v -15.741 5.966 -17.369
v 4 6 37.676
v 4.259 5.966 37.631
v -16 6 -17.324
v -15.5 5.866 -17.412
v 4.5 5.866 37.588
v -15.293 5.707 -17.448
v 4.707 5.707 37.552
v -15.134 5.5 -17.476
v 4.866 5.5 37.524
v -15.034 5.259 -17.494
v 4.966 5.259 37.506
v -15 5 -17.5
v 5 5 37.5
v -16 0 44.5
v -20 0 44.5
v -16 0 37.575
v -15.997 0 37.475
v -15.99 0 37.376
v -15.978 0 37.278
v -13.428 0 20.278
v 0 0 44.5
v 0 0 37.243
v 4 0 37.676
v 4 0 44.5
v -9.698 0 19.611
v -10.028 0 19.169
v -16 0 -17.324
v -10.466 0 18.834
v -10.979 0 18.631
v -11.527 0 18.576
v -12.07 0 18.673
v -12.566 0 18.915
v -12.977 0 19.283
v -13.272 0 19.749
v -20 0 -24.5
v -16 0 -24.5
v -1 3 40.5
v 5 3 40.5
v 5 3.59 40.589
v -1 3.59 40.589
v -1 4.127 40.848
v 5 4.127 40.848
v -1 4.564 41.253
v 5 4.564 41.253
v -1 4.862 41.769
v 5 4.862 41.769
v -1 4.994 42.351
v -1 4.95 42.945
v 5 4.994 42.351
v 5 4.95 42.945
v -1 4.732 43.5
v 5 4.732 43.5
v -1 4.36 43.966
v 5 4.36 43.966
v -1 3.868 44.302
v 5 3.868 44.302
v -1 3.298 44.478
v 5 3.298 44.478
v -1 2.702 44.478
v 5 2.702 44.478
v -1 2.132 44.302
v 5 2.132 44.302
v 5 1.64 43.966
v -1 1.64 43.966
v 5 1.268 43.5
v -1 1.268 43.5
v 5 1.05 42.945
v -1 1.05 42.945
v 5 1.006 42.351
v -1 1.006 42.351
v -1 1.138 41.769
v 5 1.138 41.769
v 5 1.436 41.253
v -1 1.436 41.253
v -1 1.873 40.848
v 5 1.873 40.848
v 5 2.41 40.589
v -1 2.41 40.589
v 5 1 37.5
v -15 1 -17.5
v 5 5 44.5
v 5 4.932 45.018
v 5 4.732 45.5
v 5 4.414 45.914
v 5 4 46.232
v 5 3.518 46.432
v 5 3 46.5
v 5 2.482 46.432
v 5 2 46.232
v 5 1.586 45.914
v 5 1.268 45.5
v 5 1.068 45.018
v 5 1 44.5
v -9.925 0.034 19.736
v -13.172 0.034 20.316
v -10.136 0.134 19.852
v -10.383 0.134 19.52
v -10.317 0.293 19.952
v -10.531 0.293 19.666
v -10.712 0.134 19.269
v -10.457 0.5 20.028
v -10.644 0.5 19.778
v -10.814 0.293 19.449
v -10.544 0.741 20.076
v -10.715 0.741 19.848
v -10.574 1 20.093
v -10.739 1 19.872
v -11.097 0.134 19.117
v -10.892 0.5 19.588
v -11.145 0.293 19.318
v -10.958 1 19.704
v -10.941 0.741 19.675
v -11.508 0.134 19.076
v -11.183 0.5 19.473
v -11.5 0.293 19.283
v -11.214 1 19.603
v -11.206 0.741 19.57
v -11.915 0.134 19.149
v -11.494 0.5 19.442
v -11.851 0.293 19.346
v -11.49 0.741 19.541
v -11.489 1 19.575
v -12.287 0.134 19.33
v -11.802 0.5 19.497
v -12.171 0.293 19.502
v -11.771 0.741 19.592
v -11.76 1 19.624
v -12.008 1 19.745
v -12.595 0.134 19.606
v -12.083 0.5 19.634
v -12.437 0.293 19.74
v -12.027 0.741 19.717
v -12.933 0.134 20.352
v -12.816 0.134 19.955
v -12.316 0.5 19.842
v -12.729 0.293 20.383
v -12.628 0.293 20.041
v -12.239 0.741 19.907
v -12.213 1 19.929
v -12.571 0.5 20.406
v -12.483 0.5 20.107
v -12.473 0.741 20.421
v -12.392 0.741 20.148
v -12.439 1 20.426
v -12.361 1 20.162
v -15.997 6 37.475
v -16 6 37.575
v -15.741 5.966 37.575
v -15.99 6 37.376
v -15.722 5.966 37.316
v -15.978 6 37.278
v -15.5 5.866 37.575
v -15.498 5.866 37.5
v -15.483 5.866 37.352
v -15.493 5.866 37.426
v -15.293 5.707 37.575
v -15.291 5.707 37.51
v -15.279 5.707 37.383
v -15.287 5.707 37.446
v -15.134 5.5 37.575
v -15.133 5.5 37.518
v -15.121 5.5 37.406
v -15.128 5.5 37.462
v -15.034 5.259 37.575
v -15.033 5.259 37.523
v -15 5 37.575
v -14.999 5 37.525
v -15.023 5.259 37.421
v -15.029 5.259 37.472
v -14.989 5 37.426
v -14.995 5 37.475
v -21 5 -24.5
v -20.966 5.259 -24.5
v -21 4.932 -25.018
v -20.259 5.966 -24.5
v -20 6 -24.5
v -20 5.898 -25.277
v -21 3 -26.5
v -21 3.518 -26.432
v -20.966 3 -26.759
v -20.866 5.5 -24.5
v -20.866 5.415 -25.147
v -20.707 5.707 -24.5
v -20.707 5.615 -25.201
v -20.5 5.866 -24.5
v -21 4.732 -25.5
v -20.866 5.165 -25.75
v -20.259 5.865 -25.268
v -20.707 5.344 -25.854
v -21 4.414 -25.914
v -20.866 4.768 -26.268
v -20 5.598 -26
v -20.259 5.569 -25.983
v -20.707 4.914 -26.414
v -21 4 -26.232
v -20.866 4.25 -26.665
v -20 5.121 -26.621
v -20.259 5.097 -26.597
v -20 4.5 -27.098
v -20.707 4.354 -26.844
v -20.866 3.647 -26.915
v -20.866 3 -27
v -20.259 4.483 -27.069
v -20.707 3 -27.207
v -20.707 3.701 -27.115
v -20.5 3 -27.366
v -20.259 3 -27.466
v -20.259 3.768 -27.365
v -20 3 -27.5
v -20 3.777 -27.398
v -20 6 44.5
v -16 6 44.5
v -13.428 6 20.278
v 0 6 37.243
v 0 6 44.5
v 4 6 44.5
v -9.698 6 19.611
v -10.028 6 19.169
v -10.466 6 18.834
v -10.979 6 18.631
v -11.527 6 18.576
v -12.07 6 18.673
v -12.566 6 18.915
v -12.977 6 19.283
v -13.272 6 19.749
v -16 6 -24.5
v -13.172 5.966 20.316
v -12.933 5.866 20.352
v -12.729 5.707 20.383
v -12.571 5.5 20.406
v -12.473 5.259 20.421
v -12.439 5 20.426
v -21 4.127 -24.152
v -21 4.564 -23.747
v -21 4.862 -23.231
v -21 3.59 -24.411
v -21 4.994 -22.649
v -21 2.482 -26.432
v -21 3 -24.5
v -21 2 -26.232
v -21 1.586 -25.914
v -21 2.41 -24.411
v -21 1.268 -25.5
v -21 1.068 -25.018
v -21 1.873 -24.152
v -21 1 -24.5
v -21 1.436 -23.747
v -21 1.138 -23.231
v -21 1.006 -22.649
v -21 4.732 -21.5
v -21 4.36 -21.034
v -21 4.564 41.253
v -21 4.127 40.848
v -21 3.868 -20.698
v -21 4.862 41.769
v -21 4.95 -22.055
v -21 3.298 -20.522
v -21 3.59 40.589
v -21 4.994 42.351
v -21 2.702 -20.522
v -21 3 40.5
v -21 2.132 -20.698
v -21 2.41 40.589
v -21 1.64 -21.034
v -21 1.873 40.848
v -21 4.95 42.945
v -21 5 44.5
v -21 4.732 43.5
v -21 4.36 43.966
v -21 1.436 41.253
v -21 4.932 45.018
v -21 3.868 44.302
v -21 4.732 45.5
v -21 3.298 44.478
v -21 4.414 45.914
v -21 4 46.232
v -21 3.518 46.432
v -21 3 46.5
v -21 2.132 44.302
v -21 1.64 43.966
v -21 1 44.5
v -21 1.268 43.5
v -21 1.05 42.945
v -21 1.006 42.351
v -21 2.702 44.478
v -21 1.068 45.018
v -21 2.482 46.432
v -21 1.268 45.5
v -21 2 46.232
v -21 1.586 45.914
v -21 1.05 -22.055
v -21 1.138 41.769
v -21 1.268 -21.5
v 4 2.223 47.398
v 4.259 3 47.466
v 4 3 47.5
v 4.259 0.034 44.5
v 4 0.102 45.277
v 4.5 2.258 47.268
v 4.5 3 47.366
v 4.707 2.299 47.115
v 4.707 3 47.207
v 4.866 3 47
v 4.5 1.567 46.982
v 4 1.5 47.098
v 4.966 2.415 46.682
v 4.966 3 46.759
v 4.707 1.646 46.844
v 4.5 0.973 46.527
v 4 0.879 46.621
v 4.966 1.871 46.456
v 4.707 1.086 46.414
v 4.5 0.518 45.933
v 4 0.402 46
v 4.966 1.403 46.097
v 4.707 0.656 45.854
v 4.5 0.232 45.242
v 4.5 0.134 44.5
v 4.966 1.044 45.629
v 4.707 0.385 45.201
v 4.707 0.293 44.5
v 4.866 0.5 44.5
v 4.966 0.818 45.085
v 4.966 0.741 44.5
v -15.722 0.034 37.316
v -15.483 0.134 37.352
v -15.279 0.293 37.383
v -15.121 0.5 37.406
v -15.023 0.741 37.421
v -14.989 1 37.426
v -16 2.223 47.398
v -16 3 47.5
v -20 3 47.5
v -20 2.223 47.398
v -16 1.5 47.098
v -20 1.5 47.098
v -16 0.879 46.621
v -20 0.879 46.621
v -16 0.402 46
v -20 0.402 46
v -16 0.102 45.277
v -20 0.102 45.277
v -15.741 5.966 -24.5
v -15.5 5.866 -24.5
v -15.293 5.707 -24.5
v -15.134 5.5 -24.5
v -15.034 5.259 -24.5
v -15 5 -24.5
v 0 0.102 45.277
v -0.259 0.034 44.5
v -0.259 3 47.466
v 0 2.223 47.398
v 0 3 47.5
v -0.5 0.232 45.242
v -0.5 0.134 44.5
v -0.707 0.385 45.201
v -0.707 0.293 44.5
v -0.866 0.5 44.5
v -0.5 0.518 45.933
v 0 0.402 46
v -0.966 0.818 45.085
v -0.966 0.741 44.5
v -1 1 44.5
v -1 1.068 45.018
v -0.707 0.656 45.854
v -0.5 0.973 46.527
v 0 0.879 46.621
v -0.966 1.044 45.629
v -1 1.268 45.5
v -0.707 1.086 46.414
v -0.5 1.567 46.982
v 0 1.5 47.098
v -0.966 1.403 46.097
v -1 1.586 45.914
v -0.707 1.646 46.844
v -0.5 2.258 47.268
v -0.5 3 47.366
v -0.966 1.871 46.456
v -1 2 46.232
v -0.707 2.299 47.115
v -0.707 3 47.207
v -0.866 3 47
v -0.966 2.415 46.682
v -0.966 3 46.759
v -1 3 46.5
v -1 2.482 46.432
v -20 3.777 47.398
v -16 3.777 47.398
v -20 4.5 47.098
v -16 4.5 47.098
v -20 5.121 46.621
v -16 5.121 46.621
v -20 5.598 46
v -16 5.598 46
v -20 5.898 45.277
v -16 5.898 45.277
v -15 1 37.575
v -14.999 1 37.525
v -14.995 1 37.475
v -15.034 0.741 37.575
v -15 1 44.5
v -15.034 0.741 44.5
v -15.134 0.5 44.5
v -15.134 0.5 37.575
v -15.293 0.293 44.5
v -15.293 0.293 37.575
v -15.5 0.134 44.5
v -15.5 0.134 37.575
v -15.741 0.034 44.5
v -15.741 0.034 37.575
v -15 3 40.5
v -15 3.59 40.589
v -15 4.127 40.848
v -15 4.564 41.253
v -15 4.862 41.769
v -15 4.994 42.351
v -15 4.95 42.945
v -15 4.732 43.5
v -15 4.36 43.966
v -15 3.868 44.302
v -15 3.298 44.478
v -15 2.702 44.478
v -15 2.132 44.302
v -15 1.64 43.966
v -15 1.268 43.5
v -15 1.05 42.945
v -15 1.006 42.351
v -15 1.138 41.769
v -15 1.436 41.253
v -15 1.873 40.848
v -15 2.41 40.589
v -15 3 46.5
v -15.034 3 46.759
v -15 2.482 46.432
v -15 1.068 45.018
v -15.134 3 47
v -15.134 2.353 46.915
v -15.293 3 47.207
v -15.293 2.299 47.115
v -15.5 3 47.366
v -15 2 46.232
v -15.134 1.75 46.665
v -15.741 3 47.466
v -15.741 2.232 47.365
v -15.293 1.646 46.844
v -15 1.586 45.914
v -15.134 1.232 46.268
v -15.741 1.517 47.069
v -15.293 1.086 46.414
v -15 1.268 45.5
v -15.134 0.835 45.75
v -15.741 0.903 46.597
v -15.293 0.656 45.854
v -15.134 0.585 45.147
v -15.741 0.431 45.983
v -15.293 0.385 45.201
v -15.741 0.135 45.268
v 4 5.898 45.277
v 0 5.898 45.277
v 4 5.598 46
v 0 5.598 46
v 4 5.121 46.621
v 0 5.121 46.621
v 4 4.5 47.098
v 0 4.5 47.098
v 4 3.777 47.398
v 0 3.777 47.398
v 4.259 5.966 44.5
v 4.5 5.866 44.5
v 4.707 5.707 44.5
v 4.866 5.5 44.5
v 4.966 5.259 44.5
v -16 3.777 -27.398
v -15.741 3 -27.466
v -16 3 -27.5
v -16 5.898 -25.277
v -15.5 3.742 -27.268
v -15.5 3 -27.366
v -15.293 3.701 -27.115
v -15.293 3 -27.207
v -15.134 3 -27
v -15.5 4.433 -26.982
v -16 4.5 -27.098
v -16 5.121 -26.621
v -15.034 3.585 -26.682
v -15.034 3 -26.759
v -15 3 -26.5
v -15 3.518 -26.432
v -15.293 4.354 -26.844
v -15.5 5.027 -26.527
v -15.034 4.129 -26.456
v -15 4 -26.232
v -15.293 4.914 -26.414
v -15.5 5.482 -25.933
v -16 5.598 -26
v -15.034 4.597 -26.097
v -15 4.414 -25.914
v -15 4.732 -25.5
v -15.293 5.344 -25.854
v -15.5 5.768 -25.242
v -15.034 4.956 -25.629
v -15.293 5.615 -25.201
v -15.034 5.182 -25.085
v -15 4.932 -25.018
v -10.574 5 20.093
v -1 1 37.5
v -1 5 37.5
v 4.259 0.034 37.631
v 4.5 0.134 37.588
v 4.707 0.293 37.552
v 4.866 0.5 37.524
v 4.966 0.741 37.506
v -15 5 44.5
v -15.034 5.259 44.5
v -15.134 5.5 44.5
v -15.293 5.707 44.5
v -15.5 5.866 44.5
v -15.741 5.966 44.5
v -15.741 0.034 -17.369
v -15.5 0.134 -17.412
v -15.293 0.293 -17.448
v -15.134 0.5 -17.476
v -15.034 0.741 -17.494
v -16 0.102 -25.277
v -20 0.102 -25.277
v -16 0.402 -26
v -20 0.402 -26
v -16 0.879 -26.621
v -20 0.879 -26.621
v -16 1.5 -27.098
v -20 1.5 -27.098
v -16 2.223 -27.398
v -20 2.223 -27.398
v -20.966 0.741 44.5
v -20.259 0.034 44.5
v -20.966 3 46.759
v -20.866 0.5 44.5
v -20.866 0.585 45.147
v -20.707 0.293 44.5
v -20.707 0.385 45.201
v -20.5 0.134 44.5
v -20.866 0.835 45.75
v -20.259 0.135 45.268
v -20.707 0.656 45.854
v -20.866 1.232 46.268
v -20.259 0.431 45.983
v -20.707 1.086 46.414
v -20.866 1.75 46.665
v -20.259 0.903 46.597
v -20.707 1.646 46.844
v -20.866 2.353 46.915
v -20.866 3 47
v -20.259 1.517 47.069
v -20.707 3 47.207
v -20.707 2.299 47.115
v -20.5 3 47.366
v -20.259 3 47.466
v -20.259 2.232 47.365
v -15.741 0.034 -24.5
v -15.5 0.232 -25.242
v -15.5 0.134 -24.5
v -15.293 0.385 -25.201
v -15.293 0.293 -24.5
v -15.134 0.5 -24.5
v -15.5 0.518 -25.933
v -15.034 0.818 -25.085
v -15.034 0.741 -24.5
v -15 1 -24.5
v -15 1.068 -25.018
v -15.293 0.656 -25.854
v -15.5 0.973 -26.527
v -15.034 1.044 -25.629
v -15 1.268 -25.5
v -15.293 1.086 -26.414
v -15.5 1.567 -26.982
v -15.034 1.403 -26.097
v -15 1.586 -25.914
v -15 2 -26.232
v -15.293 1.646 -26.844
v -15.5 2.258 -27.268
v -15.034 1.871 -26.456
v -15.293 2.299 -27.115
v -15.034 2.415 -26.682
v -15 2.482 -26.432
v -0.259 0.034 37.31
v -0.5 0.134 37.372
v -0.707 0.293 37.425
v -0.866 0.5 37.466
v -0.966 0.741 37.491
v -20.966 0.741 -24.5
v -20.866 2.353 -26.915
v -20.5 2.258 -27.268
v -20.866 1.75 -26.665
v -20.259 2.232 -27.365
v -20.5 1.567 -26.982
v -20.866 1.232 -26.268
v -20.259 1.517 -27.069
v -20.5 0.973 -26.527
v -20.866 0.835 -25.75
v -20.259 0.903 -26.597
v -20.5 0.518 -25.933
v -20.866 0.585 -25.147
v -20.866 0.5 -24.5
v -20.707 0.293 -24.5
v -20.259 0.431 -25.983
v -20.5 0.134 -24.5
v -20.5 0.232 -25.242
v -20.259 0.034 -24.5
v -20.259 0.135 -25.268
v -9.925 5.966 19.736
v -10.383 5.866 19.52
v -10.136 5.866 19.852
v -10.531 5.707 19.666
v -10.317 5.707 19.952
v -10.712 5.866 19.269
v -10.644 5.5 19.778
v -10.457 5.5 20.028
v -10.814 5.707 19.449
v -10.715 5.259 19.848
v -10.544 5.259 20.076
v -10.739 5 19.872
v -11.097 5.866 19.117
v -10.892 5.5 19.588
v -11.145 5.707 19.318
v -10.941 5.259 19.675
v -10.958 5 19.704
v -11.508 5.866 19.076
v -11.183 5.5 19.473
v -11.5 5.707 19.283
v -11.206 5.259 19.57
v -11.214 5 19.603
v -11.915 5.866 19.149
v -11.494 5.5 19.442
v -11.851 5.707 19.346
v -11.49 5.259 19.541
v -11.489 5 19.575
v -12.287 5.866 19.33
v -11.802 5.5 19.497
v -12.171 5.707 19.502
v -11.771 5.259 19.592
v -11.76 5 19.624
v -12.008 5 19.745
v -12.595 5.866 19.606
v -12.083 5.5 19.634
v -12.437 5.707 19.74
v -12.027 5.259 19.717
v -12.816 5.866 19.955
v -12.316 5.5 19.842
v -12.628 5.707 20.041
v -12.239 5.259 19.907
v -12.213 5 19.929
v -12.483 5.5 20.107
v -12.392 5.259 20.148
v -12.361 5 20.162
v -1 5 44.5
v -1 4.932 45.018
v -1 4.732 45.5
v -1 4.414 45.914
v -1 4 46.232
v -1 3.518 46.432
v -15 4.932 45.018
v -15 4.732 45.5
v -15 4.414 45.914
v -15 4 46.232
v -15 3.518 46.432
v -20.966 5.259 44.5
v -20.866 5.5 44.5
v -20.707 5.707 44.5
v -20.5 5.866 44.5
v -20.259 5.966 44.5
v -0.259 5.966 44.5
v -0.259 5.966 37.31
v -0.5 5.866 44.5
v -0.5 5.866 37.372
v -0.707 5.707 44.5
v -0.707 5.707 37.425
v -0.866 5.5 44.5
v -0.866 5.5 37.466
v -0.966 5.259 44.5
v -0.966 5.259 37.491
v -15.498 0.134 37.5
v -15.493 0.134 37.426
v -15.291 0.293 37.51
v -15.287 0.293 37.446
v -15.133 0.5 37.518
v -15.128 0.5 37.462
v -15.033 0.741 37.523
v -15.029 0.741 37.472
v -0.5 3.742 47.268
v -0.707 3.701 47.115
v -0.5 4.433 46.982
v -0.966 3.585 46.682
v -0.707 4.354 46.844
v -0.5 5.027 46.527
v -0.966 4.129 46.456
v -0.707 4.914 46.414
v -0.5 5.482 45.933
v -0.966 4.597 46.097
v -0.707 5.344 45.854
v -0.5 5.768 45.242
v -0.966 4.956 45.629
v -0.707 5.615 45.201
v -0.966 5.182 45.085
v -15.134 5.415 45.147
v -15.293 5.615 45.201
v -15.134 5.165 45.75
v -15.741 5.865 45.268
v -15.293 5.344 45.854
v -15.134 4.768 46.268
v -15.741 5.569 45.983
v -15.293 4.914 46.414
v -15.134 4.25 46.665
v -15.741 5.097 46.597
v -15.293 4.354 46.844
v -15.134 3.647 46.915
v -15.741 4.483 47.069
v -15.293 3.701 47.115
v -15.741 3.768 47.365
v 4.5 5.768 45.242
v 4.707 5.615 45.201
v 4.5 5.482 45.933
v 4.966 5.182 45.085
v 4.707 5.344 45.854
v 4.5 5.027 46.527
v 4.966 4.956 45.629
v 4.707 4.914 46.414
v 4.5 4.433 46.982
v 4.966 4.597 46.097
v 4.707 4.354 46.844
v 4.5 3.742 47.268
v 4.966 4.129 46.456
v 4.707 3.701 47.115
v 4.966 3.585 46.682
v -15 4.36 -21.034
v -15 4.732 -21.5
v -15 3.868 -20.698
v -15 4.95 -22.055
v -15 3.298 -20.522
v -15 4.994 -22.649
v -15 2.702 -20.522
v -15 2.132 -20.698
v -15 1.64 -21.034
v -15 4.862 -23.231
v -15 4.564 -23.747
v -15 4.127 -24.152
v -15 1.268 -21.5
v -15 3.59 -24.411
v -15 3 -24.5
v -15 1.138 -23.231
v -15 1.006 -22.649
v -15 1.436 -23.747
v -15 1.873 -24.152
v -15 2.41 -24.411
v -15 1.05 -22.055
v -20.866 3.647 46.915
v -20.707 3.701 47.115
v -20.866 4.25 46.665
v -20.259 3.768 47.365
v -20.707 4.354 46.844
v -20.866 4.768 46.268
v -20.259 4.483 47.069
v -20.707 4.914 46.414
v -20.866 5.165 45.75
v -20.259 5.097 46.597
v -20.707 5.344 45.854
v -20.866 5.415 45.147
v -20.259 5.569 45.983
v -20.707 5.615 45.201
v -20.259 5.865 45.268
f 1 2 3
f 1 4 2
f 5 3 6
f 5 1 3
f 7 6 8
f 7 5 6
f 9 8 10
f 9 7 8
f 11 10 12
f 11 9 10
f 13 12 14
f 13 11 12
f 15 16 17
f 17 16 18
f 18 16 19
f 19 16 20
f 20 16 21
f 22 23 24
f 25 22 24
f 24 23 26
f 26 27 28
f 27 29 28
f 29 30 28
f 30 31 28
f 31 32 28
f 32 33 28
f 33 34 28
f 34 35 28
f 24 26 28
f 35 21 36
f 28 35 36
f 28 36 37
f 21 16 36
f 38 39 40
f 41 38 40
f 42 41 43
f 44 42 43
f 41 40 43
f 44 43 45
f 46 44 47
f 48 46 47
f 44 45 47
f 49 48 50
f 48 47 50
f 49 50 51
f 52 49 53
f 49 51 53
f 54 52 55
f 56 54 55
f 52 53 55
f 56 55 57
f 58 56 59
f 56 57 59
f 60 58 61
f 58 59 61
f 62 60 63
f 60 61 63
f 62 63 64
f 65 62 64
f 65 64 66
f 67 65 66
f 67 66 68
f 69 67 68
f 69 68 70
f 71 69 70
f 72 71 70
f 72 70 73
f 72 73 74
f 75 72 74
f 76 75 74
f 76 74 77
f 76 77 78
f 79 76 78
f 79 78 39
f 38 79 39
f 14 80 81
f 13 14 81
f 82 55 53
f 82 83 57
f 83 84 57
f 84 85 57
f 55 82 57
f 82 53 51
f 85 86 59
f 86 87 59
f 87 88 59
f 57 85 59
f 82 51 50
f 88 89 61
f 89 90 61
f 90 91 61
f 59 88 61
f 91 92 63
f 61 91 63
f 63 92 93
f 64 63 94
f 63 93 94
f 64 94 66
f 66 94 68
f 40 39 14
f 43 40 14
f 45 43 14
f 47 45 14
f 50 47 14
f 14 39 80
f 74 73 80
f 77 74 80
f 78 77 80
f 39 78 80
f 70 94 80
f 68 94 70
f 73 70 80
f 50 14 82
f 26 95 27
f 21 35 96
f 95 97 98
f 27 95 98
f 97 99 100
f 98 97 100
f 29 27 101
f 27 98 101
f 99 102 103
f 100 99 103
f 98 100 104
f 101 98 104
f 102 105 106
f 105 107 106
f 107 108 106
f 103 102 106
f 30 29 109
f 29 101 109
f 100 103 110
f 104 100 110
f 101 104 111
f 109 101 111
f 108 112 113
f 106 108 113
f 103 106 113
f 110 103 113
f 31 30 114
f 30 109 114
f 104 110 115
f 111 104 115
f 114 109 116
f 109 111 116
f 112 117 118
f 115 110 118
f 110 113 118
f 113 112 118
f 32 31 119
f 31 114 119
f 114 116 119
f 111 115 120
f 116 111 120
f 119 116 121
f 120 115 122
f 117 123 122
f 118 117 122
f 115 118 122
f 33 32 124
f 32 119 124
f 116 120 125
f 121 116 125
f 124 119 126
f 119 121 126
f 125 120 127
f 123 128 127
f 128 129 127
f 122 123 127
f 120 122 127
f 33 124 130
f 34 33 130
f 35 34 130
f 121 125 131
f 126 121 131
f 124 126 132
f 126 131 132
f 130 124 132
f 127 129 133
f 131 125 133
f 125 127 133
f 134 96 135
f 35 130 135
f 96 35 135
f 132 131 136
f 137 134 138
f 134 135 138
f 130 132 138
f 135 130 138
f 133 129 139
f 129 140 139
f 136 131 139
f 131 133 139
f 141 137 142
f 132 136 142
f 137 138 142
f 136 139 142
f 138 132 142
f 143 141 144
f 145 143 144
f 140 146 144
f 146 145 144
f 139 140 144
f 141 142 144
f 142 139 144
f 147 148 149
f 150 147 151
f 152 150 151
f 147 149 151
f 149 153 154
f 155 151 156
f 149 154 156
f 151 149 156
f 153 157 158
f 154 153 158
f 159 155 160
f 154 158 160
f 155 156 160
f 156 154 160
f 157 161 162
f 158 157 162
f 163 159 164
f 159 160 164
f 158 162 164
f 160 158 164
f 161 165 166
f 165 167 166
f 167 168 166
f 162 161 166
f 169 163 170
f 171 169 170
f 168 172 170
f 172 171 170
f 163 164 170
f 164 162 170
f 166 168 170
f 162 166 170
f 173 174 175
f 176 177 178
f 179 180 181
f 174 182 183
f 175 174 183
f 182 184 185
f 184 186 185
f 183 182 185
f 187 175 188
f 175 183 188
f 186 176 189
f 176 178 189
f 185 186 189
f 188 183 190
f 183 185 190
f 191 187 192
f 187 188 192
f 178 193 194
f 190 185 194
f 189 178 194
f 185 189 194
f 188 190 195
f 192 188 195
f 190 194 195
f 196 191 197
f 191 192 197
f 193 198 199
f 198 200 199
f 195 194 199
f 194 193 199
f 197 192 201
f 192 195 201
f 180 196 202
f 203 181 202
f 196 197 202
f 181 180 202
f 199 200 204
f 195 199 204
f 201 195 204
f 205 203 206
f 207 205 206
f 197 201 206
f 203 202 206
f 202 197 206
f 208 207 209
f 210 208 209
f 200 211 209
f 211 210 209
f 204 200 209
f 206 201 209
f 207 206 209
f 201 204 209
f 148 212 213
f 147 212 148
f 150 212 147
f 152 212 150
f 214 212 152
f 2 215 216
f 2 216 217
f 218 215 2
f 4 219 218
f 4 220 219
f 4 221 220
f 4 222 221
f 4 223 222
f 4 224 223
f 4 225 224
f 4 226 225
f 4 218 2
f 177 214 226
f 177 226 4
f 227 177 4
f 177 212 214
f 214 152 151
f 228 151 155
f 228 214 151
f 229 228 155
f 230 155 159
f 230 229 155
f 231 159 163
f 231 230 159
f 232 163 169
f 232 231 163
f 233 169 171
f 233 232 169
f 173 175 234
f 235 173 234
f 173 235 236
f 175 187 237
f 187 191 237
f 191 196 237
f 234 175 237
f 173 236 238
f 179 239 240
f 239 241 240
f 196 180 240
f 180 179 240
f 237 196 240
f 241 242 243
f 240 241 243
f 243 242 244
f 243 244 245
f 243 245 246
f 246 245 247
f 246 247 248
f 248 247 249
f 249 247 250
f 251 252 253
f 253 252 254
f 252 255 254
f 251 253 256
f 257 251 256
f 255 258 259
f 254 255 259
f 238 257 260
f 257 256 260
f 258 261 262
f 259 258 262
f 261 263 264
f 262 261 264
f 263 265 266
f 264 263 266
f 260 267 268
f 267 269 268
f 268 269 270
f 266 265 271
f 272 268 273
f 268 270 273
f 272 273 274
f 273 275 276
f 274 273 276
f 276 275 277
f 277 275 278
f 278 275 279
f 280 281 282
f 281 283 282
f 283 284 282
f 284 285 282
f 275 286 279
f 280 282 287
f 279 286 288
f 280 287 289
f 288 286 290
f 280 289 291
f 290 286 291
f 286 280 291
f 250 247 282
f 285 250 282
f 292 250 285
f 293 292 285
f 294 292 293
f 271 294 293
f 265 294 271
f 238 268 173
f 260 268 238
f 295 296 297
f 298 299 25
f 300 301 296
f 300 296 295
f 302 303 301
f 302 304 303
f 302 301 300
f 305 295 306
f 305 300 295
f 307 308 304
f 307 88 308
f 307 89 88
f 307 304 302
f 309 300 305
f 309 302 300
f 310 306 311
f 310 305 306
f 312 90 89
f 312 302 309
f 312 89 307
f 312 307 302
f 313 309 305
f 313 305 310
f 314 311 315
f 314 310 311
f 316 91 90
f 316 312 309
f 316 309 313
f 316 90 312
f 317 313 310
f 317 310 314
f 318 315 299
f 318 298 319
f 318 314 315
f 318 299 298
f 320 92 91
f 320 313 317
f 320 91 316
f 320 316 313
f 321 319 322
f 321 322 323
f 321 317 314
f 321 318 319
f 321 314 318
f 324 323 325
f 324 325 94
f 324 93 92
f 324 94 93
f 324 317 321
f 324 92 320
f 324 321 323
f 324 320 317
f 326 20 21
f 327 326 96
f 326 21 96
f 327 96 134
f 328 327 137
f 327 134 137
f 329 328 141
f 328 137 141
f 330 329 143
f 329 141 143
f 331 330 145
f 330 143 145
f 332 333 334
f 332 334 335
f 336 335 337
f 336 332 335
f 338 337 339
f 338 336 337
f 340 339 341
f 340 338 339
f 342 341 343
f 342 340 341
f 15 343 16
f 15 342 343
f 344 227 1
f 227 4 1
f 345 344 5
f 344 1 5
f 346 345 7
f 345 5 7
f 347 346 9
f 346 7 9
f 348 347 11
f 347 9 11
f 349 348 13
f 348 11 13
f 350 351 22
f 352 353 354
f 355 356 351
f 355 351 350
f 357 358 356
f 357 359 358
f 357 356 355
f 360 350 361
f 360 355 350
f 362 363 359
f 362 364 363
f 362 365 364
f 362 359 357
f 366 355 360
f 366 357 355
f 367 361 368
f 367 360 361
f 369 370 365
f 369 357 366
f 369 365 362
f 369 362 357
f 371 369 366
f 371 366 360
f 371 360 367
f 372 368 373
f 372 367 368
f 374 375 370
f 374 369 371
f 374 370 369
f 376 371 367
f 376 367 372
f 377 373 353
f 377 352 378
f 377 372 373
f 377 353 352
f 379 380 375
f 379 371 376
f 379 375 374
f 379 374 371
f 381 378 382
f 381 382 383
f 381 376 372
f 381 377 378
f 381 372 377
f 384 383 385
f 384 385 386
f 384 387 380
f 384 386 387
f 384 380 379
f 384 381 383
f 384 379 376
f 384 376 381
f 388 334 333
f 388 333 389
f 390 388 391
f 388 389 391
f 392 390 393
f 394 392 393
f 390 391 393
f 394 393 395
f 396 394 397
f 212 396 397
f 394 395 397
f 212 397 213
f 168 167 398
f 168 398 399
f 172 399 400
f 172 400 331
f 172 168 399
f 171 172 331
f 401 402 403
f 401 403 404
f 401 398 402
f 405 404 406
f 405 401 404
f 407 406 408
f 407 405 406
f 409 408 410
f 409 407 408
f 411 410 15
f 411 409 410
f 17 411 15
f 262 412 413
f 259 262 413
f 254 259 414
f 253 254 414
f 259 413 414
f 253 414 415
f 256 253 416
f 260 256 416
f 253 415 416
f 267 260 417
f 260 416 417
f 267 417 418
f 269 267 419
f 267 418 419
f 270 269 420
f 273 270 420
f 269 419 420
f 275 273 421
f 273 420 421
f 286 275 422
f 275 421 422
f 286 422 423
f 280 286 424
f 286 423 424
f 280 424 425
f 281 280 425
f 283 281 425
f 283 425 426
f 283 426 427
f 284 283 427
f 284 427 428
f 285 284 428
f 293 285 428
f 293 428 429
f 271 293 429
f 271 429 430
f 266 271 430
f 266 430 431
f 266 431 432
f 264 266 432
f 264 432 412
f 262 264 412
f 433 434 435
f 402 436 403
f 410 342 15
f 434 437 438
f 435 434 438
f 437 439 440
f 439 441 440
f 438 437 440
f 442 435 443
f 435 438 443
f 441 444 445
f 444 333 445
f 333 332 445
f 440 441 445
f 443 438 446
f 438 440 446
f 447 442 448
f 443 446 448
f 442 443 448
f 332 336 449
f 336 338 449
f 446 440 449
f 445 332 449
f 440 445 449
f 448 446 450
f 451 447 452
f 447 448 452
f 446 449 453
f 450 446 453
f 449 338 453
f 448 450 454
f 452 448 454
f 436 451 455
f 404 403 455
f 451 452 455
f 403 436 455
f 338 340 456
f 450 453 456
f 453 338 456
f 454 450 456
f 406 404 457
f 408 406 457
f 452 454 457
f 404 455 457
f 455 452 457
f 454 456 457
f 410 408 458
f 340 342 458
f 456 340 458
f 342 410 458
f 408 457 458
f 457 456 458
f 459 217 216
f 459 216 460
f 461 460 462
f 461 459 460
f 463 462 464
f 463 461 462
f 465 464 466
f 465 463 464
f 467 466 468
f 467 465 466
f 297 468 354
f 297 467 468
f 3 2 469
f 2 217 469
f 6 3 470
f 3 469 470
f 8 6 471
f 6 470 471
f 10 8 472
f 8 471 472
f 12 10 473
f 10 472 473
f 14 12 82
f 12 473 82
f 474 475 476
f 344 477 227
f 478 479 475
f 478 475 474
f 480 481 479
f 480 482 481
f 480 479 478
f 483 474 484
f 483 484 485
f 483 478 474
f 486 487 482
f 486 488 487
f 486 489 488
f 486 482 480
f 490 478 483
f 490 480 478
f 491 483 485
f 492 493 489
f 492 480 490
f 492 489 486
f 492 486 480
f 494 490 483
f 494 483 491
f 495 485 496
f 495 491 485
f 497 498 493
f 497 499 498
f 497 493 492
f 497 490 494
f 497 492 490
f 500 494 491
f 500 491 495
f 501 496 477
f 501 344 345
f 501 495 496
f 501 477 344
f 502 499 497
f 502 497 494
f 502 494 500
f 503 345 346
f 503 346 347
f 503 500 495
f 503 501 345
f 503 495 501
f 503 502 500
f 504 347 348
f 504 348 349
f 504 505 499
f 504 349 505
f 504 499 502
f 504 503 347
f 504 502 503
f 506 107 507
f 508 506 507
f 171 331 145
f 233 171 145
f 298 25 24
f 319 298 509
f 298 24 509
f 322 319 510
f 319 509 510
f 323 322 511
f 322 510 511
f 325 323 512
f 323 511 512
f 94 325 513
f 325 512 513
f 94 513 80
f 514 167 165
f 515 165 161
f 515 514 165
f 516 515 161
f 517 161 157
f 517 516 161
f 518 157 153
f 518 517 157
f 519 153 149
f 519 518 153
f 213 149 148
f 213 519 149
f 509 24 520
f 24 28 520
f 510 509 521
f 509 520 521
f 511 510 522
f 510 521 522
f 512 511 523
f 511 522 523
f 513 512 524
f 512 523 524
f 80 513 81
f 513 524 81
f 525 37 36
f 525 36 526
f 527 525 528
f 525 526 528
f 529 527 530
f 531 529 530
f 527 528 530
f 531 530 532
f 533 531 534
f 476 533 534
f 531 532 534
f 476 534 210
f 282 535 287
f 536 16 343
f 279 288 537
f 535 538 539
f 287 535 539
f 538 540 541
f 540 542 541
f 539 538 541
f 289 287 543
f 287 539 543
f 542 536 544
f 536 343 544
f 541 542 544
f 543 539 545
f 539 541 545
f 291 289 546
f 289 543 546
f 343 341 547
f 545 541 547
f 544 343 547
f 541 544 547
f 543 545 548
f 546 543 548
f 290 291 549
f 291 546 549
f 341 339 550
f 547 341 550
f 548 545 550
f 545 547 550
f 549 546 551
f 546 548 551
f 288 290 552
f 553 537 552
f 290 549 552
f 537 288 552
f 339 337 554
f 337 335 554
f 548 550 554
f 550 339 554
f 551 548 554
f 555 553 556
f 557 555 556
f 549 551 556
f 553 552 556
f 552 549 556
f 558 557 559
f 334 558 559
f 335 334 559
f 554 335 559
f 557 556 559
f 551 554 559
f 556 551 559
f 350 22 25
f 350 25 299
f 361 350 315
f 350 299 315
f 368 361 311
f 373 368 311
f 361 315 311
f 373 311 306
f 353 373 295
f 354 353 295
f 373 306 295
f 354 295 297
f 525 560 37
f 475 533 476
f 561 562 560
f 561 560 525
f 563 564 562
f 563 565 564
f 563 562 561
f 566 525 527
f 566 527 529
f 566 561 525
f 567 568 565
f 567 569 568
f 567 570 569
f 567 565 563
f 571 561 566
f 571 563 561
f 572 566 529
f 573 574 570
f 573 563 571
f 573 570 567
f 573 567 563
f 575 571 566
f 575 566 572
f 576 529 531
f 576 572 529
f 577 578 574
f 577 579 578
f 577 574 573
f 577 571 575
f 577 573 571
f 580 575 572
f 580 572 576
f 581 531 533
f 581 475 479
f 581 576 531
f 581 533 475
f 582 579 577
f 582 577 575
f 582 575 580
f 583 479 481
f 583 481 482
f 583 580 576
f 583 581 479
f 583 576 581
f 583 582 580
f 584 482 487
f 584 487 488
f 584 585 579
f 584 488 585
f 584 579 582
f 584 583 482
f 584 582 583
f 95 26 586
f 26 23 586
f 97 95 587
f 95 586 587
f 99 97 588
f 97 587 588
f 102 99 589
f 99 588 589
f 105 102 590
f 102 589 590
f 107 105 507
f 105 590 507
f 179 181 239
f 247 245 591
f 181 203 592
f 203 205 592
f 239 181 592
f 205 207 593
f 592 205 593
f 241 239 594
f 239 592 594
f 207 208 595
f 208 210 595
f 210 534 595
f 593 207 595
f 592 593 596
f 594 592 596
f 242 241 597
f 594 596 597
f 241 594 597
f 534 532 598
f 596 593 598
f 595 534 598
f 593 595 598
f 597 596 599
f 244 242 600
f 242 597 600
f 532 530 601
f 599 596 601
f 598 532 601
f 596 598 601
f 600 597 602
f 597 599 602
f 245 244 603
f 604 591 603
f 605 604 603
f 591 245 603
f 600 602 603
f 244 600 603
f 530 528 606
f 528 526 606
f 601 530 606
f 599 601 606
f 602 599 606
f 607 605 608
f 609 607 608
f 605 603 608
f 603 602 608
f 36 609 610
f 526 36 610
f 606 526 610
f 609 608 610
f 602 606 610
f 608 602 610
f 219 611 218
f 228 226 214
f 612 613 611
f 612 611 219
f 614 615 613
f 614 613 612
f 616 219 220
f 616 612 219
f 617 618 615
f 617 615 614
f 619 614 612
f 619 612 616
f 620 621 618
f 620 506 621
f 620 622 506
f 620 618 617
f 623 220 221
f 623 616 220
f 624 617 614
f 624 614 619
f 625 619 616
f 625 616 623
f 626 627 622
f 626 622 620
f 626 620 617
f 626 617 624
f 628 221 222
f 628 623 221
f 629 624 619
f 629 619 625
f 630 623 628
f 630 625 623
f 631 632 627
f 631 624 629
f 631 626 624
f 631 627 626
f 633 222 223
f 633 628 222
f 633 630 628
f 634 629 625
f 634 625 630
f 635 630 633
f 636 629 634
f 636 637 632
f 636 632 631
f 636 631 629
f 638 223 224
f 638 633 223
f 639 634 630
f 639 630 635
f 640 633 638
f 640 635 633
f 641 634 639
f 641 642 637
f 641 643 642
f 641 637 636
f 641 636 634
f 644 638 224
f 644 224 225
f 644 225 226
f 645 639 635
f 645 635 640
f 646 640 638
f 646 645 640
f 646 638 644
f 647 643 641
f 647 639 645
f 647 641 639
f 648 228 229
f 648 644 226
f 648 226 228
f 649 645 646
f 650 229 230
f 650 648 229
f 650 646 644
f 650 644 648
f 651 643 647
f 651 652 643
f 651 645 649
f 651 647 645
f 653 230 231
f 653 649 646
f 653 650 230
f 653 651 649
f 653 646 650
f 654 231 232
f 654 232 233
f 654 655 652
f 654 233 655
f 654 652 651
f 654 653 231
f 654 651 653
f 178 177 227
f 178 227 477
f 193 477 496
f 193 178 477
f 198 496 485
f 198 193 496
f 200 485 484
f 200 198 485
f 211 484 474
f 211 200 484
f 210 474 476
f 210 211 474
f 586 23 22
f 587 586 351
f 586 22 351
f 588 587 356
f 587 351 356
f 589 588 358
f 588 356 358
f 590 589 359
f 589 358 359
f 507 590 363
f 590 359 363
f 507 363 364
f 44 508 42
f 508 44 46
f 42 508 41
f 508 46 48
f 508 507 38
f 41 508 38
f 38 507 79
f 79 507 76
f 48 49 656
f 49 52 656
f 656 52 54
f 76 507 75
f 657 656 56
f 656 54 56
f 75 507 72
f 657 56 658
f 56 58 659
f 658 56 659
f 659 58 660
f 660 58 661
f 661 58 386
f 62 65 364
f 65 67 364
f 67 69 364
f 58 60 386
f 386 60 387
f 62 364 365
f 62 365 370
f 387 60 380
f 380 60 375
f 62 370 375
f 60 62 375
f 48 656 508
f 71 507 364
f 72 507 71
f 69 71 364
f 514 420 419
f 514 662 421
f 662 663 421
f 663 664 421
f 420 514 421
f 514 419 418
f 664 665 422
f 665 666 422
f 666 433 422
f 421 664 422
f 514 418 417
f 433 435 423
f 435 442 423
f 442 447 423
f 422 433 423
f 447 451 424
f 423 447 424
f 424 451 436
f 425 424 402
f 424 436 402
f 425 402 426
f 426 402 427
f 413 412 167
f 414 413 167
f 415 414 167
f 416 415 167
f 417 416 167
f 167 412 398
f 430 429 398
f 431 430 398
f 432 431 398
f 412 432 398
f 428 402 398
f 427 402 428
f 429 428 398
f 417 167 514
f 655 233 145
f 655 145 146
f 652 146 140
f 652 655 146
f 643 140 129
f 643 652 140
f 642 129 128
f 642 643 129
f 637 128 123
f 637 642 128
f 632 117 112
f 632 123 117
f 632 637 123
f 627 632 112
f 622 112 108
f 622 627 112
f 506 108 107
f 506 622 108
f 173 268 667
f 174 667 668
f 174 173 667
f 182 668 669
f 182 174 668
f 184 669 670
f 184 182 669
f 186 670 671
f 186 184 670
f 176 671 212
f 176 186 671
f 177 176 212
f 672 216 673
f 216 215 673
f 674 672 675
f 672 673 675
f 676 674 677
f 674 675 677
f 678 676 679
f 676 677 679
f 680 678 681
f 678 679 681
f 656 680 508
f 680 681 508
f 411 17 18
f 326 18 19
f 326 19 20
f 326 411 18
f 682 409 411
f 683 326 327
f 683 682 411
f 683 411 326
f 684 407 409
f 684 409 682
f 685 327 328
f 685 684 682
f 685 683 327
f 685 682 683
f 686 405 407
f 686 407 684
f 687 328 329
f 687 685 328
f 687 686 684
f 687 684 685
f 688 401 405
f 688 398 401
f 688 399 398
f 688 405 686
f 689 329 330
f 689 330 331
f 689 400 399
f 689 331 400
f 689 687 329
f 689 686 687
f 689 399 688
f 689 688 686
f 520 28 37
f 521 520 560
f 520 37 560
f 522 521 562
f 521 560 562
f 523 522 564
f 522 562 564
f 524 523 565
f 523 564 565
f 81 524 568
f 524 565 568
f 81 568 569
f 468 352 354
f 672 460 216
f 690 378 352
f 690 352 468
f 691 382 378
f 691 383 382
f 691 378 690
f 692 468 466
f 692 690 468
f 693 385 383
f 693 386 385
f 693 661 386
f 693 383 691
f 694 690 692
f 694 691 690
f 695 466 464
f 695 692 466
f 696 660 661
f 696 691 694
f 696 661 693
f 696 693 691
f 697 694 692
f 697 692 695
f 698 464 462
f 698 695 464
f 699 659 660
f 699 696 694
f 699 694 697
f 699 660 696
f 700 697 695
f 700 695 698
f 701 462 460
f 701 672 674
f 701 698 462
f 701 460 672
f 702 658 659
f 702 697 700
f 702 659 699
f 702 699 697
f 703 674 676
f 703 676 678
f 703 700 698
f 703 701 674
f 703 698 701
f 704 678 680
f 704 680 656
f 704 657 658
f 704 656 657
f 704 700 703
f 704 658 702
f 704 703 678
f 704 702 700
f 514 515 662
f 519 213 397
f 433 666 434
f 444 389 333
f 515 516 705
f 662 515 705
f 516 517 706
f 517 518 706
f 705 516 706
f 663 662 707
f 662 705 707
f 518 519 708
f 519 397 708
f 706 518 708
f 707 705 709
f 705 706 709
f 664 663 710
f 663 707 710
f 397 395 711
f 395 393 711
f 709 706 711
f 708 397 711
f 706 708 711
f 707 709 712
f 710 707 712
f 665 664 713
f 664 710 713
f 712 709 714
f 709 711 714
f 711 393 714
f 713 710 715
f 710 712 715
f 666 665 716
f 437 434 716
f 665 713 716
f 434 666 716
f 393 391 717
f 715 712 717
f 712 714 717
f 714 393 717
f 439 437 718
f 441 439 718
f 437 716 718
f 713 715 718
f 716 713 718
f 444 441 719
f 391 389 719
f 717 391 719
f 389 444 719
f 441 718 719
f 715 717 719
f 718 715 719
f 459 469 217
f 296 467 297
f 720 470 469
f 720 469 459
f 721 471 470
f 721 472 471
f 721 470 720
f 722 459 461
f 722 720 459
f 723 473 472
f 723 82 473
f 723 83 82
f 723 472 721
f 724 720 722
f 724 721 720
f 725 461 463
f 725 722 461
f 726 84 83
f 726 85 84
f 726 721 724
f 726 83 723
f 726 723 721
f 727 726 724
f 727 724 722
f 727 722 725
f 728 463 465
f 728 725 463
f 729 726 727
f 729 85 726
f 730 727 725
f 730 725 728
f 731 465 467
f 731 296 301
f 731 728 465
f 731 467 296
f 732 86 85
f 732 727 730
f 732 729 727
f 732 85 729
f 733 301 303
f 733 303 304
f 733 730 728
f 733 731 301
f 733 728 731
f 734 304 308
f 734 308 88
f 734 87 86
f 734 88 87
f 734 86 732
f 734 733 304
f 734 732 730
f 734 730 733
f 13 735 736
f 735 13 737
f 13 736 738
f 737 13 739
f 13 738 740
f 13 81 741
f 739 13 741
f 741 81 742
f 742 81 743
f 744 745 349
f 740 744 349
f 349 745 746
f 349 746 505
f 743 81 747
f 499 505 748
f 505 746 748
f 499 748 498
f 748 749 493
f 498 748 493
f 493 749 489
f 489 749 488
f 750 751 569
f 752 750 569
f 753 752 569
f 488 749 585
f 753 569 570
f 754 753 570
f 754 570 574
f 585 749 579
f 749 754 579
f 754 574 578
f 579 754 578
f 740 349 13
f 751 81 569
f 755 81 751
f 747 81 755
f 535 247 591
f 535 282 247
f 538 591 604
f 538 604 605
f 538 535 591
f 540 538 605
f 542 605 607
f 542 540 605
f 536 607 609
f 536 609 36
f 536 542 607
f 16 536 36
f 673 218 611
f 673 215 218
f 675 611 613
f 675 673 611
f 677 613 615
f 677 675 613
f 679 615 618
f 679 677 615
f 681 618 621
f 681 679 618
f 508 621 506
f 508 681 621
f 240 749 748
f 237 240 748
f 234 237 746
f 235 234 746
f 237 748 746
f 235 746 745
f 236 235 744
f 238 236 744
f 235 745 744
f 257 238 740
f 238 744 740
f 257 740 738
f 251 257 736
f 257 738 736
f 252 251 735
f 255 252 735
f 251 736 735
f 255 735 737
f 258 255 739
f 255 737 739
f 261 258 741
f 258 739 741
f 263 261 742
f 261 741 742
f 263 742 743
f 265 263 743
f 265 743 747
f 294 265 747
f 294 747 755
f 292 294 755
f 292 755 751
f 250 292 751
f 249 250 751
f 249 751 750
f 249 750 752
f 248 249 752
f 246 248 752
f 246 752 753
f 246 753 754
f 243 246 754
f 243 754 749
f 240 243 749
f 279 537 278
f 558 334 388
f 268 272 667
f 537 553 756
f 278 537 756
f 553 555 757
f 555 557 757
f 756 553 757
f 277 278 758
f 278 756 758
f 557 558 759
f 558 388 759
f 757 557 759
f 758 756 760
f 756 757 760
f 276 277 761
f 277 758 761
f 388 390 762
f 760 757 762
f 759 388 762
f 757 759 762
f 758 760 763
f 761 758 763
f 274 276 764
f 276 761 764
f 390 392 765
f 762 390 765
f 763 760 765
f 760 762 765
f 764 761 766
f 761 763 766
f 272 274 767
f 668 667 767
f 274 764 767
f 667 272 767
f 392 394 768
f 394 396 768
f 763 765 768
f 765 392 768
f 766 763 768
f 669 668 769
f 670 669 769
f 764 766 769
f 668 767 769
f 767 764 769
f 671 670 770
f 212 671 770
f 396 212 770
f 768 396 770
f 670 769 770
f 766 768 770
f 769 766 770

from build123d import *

# Parameters (mm, degrees)
BOSS_EXTRUDE1_DEPTH = 6
SKETCH3_R           = 2
CUT_EXTRUDE1_DEPTH  = 55.481648286
SKETCH4_R           = 2
CUT_EXTRUDE2_DEPTH  = 52.886896226
FILLET1_R           = 3
FILLET2_R           = 1


with BuildPart() as part:
    # Sketch2 → Boss-Extrude1 (new body)
    with BuildSketch(Plane(origin=(0, 0, 0), x_dir=(1, 0, 0), z_dir=(0, 1, 0))):
        Polygon((-21, 17.5), (-21, -47.5), (-15, -47.5), (-15, -37.5), (-12, -17.5), (-1, -37.5), (-1, -47.5), (5, -47.5), (5, -37.5), (-15, 17.5), (-15, 27.5), (-21, 27.5), align=None)
    extrude(amount=BOSS_EXTRUDE1_DEPTH)

    # Sketch3 → Cut-Extrude1 (cut, through all)
    with BuildSketch(Plane(origin=(5, 0, 0), x_dir=(0, 0, -1), z_dir=(1, 0, 0))):
        with Locations((-42.5, 3)):
            Circle(SKETCH3_R)
    extrude(amount=-CUT_EXTRUDE1_DEPTH, mode=Mode.SUBTRACT)

    # Sketch4 → Cut-Extrude2 (cut, through all)
    with BuildSketch(Plane(origin=(-15, 0, 0), x_dir=(0, 0, -1), z_dir=(1, 0, 0))):
        with Locations((22.5, 3)):
            Circle(SKETCH4_R)
    extrude(amount=-CUT_EXTRUDE2_DEPTH, mode=Mode.SUBTRACT)

    # Fillet1
    fillet1_edges = [part.edges().sort_by_distance(p)[0] for p in [
        (-18, 0, -27.5),
        (-18, 6, -27.5),
        (2, 0, 47.5),
        (2, 6, 47.5),
        (-18, 0, 47.5),
        (-18, 6, 47.5),
    ]]
    fillet(fillet1_edges, radius=FILLET1_R - 0.0001)  # a hair under: the kernel refuses the full size

    # Fillet2
    fillet2_edges = [part.edges().sort_by_distance(p)[0] for p in [
        (-15, 0, -21.00005),
        (-5, 0, 10),
        (-1, 0, 41.00005),
        (-6.5, 0, 27.5),
        (-13.5, 0, 27.5),
        (-13.5, 6, 27.5),
        (-12, 3, 17.5),
        (-15, 3, 37.5),
        (-6.5, 6, 27.5),
        (-1, 6, 41.00005),
        (-5, 6, 10),
        (-15, 6, -21.00005),
        (-21, 0, 10),
        (-21, 6, 10),
        (-21, 5.121349633, 46.621349633),
        (-21, 0.878650367, 46.621349633),
        (-21, 5.121349633, -26.621349633),
        (-21, 0.878650367, -26.621349633),
        (5, 0, 41.00005),
        (-15, 0, 41.00005),
        (-15, 5.121349633, -26.621349633),
        (-15, 0.878650367, -26.621349633),
        (-15, 6, 41.00005),
        (5, 6, 41.00005),
        (5, 5.121349633, 46.621349633),
        (5, 0.878650367, 46.621349633),
        (-1, 5.121349633, 46.621349633),
        (-1, 0.878650367, 46.621349633),
        (-15, 5.121349633, 46.621349633),
        (-15, 0.878650367, 46.621349633),
    ]]
    fillet(fillet2_edges, radius=FILLET2_R - 0.0001)  # a hair under: the kernel refuses the full size


solid = part.part
